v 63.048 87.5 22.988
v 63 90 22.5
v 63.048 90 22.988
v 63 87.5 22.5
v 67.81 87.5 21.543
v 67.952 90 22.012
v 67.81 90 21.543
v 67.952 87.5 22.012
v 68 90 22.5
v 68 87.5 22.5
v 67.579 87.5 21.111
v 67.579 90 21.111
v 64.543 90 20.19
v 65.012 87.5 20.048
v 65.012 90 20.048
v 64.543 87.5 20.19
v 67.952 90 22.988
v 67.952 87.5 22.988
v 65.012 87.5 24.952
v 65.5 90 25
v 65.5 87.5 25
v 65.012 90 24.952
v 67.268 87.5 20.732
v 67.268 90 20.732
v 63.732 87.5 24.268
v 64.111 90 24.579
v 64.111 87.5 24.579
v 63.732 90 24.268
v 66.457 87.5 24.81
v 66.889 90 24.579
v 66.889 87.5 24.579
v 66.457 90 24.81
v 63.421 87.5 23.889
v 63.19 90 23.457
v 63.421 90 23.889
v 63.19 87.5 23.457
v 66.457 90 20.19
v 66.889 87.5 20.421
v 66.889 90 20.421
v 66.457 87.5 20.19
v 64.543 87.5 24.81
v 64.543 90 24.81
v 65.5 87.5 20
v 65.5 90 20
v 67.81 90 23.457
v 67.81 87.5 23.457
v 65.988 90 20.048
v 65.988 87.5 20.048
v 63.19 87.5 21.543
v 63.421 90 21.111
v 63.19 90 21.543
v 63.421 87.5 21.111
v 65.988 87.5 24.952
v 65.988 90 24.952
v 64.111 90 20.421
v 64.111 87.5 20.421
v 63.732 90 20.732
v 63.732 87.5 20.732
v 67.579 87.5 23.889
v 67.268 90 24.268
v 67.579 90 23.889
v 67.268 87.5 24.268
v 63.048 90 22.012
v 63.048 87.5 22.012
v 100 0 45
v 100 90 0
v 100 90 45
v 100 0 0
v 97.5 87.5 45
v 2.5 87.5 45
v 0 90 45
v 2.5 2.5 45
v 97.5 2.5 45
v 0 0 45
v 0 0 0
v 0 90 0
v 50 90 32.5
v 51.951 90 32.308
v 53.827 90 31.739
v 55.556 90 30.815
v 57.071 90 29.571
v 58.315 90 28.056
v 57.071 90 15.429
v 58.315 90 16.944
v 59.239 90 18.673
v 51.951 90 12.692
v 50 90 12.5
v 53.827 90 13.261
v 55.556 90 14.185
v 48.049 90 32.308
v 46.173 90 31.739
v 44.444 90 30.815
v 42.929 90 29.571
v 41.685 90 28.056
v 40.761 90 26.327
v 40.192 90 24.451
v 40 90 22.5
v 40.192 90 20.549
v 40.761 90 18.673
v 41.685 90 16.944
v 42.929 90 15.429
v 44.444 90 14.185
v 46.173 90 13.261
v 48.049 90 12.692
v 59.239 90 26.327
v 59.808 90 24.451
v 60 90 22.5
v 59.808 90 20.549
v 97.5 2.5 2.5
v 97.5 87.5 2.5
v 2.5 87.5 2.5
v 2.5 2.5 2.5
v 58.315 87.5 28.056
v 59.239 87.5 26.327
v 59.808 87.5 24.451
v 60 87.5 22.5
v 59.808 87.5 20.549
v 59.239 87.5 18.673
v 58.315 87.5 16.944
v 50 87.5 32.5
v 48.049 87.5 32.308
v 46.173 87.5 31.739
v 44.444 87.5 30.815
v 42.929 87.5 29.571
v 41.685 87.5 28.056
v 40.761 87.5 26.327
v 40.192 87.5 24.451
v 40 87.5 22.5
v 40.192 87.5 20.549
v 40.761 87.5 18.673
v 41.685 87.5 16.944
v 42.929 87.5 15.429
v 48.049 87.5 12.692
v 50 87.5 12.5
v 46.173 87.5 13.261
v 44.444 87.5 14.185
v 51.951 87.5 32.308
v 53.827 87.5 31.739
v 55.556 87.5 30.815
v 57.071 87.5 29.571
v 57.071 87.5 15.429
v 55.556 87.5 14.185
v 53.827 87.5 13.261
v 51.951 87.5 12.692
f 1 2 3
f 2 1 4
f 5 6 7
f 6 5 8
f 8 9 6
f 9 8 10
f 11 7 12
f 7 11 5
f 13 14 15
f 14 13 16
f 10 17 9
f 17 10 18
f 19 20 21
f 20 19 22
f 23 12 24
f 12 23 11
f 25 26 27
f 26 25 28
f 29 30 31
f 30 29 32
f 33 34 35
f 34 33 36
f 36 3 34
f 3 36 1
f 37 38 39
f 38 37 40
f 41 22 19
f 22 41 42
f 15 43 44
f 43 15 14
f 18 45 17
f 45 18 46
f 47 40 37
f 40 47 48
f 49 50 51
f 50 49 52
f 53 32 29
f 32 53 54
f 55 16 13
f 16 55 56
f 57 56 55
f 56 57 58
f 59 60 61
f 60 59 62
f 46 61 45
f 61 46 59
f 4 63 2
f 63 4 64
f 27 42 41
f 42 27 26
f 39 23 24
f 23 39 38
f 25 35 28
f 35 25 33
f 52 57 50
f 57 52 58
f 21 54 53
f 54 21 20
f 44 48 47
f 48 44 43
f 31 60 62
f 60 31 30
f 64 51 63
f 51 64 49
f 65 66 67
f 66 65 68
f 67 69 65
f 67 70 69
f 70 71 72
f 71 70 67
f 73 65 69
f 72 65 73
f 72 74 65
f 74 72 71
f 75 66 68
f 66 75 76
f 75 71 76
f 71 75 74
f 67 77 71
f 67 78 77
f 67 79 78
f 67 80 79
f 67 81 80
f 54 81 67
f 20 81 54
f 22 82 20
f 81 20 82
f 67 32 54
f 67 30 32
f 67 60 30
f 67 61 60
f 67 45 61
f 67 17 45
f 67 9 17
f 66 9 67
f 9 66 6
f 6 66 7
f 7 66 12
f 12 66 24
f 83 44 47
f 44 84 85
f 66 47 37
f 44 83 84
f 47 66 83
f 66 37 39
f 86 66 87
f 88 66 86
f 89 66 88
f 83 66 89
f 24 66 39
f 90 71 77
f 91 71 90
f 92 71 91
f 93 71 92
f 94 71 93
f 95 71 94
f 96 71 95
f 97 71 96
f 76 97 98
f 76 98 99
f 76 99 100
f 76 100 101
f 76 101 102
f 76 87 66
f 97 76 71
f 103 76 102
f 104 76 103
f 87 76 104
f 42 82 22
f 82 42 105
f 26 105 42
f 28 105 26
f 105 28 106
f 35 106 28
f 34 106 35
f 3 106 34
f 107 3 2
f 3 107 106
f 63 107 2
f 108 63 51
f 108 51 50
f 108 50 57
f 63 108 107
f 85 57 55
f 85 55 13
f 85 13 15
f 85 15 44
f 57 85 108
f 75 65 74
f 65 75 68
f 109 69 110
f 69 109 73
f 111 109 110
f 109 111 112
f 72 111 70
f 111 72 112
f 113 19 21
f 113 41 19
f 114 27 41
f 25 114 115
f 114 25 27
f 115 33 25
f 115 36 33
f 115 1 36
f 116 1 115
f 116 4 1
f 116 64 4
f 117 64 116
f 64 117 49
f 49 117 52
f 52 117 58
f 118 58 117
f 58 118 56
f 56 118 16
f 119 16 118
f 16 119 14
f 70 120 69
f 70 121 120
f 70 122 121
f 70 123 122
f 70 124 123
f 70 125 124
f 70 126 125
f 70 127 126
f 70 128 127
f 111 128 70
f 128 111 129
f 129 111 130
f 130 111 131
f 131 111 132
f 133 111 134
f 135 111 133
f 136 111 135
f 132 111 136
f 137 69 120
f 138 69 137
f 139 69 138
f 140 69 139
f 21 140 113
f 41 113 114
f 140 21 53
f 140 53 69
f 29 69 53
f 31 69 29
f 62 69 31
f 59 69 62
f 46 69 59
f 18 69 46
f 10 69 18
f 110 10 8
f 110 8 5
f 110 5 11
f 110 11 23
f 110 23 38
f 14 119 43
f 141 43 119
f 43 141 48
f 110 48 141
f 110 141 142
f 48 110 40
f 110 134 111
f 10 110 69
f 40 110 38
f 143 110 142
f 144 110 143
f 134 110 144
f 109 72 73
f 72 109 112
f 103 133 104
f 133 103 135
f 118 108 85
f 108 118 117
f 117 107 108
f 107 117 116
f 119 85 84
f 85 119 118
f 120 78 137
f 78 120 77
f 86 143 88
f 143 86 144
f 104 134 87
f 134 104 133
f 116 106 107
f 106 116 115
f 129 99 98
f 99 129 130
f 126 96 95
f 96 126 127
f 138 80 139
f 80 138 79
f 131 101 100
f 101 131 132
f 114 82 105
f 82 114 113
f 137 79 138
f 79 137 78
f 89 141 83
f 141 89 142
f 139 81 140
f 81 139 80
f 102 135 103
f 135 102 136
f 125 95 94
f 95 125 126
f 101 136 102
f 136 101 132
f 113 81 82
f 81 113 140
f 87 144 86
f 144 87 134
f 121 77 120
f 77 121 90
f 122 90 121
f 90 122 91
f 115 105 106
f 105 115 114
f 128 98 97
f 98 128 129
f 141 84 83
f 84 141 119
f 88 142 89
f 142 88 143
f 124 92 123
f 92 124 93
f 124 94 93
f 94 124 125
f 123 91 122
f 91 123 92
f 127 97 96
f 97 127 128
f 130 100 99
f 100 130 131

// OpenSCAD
$fn = 32;

// ----------------------------------------------------------------------
// Vent box: roundvent enclosure
// ----------------------------------------------------------------------

// --- parameters (mm) ---
box_l = 100;              // box length, X
box_w = 90;               // box width, Y
box_h = 45;               // box height, Z
wall_t = 2.5;             // shell wall thickness
vent_d = 20;              // central vent diameter
ring_d = 5;               // ring hole diameter
n_ring = 6;               // holes in the ring
ring_r = 15.5;            // ring radius

ring_step = 360 / n_ring;  // ring hole angular step

difference() {
  cube([box_l, box_w, box_h]);
  translate([wall_t, wall_t, wall_t])
    cube([box_l - 2 * wall_t, box_w - 2 * wall_t, box_h]);
  translate([box_l / 2, box_w - wall_t - 1, box_h / 2])
    rotate([-90, 0, 0]) cylinder(h = wall_t + 2, d = vent_d);
  for (i = [0 : n_ring - 1])
    translate([box_l / 2, box_w - wall_t - 1, box_h / 2])
      rotate([0, 0, i * ring_step])
        translate([ring_r, 0, 0]) rotate([-90, 0, 0])
          cylinder(h = wall_t + 2, d = ring_d);
}
